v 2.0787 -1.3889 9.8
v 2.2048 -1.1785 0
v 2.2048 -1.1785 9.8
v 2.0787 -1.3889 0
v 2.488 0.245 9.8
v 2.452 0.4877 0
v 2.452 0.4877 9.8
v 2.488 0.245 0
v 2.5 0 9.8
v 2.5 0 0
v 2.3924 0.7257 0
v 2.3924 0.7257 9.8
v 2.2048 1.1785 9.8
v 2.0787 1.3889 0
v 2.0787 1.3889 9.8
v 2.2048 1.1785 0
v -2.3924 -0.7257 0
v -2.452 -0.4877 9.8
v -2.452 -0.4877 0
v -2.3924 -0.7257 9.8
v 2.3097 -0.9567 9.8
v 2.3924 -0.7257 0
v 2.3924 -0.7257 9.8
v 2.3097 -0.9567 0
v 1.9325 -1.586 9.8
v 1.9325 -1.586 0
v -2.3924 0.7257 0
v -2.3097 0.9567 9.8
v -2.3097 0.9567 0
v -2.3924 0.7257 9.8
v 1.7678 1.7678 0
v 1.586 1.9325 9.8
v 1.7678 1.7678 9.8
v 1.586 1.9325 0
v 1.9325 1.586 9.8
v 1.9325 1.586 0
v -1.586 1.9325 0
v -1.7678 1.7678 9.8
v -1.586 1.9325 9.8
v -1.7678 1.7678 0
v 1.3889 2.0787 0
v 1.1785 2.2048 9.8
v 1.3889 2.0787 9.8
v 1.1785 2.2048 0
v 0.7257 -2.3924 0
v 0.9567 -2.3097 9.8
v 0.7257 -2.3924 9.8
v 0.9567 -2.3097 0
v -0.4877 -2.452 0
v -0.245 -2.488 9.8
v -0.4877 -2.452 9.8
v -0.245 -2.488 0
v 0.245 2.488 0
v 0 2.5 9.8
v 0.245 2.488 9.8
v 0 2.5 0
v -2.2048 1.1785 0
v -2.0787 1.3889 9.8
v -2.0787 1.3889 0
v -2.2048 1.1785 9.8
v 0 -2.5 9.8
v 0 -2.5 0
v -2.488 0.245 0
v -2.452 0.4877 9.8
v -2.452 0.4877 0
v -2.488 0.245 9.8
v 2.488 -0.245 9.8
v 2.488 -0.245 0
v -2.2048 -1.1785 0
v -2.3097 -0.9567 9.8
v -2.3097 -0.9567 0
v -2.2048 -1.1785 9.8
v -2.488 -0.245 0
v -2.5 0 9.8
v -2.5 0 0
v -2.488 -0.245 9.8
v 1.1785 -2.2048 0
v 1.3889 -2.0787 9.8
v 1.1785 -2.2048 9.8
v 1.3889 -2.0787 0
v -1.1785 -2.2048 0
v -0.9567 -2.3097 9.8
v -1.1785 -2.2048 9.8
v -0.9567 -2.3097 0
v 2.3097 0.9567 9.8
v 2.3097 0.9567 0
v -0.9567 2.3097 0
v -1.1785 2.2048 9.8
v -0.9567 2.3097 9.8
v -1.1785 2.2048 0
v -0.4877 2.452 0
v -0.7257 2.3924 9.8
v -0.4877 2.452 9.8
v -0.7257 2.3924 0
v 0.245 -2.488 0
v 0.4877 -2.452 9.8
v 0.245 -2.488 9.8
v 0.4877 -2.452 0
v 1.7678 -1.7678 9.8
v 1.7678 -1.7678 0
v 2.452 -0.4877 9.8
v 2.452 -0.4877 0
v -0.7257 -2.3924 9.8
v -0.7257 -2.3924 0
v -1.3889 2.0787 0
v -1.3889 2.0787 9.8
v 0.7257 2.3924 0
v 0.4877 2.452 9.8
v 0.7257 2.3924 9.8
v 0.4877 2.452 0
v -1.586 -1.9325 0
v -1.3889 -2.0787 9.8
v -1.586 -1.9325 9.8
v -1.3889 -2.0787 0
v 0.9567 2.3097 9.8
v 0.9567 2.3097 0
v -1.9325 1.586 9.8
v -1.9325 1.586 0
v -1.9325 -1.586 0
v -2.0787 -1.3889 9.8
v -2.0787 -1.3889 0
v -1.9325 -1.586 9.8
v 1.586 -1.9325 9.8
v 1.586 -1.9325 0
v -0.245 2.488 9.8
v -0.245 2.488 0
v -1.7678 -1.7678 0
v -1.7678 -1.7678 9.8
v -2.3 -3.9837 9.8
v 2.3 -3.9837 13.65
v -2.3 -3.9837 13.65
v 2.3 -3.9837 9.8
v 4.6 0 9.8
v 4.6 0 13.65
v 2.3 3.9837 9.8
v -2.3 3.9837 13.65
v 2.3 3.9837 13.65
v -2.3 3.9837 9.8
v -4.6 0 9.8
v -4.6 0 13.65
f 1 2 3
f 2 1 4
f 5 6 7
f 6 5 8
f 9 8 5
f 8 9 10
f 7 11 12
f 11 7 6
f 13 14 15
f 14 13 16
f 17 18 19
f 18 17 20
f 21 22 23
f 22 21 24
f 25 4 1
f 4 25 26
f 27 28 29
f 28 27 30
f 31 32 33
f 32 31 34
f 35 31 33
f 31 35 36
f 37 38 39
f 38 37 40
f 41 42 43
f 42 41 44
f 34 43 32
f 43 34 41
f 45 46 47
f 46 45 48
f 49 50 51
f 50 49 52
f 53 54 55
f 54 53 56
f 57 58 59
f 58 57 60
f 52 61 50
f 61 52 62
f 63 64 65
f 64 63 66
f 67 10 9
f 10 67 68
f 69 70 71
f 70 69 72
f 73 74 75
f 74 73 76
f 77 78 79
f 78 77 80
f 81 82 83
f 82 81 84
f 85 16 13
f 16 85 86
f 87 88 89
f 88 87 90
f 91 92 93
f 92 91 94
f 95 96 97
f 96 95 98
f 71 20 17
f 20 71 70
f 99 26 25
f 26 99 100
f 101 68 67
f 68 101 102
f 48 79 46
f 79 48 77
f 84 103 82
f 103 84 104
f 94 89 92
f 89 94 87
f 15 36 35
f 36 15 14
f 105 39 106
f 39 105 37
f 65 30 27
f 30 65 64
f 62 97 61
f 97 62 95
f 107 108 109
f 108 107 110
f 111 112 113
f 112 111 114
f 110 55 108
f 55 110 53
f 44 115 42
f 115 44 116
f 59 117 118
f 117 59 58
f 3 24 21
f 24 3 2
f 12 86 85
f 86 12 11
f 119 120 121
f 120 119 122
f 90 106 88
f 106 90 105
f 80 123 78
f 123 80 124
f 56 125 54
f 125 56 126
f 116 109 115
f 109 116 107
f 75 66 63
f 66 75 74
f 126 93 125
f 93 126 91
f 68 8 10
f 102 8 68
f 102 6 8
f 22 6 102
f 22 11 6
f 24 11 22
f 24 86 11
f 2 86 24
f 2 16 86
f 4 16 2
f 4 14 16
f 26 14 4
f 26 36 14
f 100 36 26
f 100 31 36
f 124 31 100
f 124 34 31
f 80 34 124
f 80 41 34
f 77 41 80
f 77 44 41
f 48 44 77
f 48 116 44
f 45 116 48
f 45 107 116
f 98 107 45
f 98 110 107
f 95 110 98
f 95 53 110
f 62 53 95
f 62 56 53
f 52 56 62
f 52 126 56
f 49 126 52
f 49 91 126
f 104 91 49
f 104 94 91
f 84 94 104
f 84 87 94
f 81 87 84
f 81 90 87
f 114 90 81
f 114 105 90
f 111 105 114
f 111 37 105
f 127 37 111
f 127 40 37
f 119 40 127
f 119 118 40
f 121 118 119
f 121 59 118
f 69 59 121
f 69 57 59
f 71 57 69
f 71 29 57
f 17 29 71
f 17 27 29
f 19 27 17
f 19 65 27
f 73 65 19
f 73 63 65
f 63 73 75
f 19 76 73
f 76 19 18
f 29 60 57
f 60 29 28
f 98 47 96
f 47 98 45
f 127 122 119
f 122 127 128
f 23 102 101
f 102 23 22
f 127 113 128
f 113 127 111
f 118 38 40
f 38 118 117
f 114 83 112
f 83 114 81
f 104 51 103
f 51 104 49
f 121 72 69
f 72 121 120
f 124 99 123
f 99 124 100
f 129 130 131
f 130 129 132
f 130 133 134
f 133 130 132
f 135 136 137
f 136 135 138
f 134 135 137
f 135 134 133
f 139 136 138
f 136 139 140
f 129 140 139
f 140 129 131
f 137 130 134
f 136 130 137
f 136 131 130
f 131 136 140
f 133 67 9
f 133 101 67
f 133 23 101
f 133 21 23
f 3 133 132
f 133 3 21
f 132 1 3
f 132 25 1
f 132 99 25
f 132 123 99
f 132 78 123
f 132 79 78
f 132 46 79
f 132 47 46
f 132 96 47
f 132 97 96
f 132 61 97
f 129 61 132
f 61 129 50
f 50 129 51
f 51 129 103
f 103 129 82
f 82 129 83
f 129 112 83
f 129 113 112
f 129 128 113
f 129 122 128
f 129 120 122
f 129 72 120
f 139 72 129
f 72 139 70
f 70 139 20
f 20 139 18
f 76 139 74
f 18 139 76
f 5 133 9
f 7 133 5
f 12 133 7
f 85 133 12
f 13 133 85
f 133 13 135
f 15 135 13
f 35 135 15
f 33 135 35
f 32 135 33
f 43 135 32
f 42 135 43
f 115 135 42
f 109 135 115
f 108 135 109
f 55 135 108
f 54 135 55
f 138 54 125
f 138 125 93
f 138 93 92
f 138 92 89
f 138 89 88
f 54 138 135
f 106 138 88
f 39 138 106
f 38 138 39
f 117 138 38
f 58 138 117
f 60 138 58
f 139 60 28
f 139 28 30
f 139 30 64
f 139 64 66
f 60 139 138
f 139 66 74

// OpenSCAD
// Hex head screw (single connected solid)
// Requested: 5.0mm shaft diameter, 9.2mm head diameter, 3.65mm head height, 10mm long

shaft_diameter_mm = 5.0;
length_mm         = 10.0;   // length under head
head_diameter_mm  = 9.2;    // across corners for $fn=6 cylinder
head_height_mm    = 3.65;

overlap_mm        = 0.2;    // small overlap to guarantee manifold union
$fn               = 64;

module hex_head_screw(d=5.0, L=10.0, head_d=9.2, head_h=3.65, overlap=0.2) {
    union() {
        // Shaft: from z=0 to z=L
        translate([0,0,L/2])
            cylinder(h=L, r=d/2, center=true);

        // Hex head: sits on top of shaft, from z=L to z=L+head_h
        translate([0,0,L + head_h/2 - overlap/2])
            cylinder(h=head_h + overlap, r=head_d/2, $fn=6, center=true);
    }
}

hex_head_screw(
    d=shaft_diameter_mm,
    L=length_mm,
    head_d=head_diameter_mm,
    head_h=head_height_mm,
    overlap=overlap_mm
);
